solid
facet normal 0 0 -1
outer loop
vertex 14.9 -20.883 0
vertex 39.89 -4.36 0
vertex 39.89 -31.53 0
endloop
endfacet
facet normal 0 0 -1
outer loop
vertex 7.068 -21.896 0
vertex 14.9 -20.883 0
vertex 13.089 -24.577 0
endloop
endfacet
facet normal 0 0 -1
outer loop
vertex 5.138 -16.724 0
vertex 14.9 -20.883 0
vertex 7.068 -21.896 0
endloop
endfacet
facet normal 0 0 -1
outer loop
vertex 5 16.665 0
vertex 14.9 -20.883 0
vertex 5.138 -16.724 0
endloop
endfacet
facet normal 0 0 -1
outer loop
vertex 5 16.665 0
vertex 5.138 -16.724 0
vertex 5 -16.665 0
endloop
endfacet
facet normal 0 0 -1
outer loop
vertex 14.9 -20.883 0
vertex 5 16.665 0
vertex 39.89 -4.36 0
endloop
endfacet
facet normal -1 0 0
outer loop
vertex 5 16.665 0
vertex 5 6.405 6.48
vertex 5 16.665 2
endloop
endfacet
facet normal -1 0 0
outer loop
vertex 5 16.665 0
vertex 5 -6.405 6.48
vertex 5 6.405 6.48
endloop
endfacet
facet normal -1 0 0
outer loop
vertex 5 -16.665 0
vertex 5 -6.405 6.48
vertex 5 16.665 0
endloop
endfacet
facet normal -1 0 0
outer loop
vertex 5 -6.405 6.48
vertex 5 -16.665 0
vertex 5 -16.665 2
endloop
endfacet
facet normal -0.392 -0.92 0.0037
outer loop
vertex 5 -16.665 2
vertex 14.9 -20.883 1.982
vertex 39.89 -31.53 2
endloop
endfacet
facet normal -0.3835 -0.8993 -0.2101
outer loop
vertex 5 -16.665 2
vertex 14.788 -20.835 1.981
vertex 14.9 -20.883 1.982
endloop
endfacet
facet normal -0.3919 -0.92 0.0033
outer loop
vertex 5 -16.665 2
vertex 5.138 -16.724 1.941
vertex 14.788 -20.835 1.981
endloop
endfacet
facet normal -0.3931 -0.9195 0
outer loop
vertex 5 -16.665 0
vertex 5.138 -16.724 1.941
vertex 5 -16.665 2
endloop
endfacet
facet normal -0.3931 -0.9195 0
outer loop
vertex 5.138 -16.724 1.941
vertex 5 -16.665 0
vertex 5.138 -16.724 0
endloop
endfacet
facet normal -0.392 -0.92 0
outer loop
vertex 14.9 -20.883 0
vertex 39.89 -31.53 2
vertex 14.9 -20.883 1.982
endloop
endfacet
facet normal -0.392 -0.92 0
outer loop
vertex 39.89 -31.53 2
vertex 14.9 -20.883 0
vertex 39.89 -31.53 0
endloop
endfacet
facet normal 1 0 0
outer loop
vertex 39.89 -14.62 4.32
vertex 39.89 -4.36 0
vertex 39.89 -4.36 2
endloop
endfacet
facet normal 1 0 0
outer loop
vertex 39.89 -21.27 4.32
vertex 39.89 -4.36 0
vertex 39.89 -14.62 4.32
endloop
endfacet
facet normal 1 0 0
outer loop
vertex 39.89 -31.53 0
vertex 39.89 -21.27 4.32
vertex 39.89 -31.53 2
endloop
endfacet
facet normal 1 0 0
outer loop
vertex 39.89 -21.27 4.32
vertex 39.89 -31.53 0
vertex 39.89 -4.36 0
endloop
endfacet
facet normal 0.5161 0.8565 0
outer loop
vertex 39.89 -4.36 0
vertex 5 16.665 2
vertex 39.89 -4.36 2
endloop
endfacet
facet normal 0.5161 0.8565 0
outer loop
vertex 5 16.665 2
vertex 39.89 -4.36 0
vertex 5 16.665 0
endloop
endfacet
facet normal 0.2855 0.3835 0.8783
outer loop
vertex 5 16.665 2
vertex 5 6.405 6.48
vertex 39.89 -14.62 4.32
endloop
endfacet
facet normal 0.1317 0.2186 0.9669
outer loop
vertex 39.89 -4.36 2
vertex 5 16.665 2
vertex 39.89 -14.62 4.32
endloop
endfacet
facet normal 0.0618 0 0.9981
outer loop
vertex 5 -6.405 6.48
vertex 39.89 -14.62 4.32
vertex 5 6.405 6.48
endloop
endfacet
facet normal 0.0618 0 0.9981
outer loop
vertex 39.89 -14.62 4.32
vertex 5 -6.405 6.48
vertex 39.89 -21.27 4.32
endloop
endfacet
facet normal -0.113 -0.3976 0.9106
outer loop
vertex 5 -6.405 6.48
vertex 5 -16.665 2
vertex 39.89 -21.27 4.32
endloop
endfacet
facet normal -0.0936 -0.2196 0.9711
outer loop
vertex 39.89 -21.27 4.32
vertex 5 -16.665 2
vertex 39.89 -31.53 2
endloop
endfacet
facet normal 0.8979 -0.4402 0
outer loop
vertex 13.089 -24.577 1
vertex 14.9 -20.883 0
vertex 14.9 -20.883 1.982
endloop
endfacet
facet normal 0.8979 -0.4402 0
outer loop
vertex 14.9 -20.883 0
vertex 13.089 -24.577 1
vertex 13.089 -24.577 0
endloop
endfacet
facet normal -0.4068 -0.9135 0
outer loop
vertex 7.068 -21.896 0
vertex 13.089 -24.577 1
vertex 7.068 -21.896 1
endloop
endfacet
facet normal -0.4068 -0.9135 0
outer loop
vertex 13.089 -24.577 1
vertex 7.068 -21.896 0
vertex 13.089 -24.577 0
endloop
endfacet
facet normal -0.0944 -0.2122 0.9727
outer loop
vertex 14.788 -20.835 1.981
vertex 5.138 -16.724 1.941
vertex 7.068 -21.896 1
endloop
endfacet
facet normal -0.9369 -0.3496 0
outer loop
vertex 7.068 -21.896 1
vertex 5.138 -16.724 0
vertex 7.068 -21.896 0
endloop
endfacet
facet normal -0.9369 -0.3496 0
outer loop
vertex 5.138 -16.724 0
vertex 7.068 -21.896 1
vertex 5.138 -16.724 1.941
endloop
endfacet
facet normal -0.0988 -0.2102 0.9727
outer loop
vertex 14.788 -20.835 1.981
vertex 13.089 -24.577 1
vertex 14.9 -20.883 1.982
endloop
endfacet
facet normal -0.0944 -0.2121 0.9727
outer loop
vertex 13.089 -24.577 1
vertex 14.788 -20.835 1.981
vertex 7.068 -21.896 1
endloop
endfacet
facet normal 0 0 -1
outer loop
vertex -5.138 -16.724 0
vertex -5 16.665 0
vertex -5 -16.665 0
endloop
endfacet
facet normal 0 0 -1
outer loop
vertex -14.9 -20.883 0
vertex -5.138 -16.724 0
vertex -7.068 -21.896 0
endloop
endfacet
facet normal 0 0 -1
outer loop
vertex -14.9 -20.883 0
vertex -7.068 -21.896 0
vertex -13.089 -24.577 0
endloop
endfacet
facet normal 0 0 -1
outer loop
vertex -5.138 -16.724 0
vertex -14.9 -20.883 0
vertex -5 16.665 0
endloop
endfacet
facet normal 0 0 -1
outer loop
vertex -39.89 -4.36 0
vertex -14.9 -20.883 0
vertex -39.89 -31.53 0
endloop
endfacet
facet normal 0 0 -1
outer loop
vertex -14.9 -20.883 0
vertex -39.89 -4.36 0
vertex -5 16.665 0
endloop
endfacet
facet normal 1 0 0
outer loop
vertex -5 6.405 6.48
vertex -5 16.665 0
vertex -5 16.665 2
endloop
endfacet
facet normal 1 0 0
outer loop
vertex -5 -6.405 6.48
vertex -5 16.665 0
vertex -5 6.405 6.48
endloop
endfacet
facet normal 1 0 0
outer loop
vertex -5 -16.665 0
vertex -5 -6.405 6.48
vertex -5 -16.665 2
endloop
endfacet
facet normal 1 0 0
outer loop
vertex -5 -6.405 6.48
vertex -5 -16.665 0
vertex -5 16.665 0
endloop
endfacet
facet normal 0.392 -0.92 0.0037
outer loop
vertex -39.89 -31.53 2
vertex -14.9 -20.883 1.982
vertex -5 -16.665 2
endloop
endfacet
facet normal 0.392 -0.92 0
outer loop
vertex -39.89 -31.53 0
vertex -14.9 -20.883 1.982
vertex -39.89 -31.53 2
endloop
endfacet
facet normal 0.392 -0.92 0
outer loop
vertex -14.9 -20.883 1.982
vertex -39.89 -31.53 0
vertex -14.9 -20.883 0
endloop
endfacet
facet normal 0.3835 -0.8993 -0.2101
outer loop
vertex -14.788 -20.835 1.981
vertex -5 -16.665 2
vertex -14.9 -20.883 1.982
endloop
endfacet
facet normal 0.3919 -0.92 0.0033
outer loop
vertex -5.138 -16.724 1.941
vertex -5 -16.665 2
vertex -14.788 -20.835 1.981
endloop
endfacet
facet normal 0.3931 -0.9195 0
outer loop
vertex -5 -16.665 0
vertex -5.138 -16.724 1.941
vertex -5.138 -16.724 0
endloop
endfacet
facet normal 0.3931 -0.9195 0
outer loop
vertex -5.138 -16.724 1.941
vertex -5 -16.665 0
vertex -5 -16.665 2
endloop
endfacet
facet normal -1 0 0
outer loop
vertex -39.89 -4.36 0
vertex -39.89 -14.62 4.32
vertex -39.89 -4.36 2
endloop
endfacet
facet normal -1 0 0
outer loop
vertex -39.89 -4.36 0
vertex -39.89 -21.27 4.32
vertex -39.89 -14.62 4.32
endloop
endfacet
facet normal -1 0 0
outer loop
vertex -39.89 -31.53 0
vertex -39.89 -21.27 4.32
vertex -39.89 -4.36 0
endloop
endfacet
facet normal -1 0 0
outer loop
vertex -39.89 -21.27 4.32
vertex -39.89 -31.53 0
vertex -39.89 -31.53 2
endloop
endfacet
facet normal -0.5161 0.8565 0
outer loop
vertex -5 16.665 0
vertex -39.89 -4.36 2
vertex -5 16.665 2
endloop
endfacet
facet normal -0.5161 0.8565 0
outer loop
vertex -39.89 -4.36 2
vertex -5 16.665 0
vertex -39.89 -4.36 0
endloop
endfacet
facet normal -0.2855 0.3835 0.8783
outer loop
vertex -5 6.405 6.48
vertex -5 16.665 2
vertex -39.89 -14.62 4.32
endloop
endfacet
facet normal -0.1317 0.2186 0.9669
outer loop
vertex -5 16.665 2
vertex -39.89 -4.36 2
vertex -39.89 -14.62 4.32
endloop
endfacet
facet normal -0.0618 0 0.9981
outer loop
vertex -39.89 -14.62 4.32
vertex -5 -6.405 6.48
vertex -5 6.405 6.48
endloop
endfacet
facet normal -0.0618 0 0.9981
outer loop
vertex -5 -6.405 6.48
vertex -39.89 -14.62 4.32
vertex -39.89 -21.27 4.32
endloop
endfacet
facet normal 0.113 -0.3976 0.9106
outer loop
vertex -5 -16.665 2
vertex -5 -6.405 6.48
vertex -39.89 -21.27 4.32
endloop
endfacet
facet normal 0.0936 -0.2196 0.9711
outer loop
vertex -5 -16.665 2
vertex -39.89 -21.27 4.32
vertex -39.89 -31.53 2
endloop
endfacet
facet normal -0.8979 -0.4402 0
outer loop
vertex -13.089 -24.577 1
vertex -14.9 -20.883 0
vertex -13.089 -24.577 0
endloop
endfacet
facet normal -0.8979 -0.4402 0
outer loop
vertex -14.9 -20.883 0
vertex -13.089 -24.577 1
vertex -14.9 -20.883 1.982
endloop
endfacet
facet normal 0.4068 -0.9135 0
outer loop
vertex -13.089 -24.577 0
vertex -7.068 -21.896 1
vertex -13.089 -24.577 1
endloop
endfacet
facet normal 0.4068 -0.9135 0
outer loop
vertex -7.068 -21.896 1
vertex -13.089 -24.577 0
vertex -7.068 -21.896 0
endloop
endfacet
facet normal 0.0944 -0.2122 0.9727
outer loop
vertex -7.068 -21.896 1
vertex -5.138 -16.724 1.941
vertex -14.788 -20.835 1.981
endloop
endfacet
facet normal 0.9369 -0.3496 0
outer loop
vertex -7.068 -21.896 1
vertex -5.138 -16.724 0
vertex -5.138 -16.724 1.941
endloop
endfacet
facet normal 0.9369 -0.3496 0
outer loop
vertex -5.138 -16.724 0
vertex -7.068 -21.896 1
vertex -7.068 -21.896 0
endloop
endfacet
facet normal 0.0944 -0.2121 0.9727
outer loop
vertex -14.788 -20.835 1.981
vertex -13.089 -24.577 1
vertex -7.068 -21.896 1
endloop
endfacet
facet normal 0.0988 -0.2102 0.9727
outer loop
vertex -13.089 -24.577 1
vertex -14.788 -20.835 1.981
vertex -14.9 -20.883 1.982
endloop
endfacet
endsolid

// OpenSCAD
$fn=30;
base_thick=6.48;
tip_thick=4.32;
base_len=33.33;
tip_len=30.3;
width=34.89;
edge=2;
topoff=10.26;

back_base=14*width/45;
back_tip=8.5*width/45;
back_len=5.4*width/45;

translate([ 5,0,0]) strut();
translate([-5,0,0]) mirror([1,0,0]) strut();

module strut() {
    ifrac=0.8;
    ofrac=1-ifrac;
    inner_tip=ifrac*back_tip;
    outer_tip=-ofrac*back_tip;
    union() {
        polyhedron(
            points = [
                // base: 0 : 3
                [0, base_len/2, 0], [0, -base_len/2, 0], [width, -tip_len/2-width*sin(28), 0], [width, tip_len/2-width*sin(34), 0],
                // top, right: 4 : 7
                [0, base_len/2, edge], [0, base_len/2-topoff, base_thick], [0, -base_len/2+topoff, base_thick], [0, -base_len/2, edge],
                // top, left: 8 : 11
                [width, -tip_len/2-width*sin(28), edge], [width, -tip_len/2+topoff-width*sin(28), tip_thick], [width, tip_len/2-topoff-width*sin(34), tip_thick], [width, tip_len/2-width*sin(34), edge],
            ],
            triangles = [
                //base:0,1
                [0, 3, 1], [3, 2, 1],
                // right: 2 : 5
                [1, 7, 6], [1, 6, 0], [6, 5, 0], [0, 5, 4],
                // back: 6, 7
                [1, 2, 8], [1, 8, 7],
                // left: 8 : 11
                [3, 11, 10], [3, 10, 2], [10, 9, 2], [2, 9, 8],
                // front: 12, 13
                [0, 4, 11], [11, 3, 0],
                // front,top: 14, 15
                [4, 5, 10], [10, 11, 4],
                // top: 16, 17
                [5, 6, 10], [6, 9, 10],
                // back,top: 14, 15
                [6, 7, 9], [7, 8, 9],
            ]
        );
        translate([1.25*back_len*cos(38),-base_len*sin(38),0]) rotate([0,0,-24]) polyhedron(
            points = [
                [-back_base/2, back_len/2, 0], [back_base/2, back_len/2, 0], [inner_tip, -back_len/2, 0], [outer_tip, -back_len/2, 0],
                [-back_base/2, back_len/2, edge], [back_base/2, back_len/2, edge], [inner_tip, -back_len/2, edge/2], [outer_tip, -back_len/2, edge/2],
            ],
            triangles = [
                // base: 0, 1
                [1, 0, 3], [3, 2, 1],
                // front; 2, 3
                [0, 1, 5], [5, 4, 0],
                // left: 4, 5
                [0, 4, 7], [7, 3, 0],
                // back: 6, 7
                [3, 7, 6], [6, 2, 3],
                // right: 8, 9
                [2, 6, 5], [5, 1, 2],
                // top: 10, 11
                [4, 5, 6], [6, 7, 4],
            ]
        );
    }
}
